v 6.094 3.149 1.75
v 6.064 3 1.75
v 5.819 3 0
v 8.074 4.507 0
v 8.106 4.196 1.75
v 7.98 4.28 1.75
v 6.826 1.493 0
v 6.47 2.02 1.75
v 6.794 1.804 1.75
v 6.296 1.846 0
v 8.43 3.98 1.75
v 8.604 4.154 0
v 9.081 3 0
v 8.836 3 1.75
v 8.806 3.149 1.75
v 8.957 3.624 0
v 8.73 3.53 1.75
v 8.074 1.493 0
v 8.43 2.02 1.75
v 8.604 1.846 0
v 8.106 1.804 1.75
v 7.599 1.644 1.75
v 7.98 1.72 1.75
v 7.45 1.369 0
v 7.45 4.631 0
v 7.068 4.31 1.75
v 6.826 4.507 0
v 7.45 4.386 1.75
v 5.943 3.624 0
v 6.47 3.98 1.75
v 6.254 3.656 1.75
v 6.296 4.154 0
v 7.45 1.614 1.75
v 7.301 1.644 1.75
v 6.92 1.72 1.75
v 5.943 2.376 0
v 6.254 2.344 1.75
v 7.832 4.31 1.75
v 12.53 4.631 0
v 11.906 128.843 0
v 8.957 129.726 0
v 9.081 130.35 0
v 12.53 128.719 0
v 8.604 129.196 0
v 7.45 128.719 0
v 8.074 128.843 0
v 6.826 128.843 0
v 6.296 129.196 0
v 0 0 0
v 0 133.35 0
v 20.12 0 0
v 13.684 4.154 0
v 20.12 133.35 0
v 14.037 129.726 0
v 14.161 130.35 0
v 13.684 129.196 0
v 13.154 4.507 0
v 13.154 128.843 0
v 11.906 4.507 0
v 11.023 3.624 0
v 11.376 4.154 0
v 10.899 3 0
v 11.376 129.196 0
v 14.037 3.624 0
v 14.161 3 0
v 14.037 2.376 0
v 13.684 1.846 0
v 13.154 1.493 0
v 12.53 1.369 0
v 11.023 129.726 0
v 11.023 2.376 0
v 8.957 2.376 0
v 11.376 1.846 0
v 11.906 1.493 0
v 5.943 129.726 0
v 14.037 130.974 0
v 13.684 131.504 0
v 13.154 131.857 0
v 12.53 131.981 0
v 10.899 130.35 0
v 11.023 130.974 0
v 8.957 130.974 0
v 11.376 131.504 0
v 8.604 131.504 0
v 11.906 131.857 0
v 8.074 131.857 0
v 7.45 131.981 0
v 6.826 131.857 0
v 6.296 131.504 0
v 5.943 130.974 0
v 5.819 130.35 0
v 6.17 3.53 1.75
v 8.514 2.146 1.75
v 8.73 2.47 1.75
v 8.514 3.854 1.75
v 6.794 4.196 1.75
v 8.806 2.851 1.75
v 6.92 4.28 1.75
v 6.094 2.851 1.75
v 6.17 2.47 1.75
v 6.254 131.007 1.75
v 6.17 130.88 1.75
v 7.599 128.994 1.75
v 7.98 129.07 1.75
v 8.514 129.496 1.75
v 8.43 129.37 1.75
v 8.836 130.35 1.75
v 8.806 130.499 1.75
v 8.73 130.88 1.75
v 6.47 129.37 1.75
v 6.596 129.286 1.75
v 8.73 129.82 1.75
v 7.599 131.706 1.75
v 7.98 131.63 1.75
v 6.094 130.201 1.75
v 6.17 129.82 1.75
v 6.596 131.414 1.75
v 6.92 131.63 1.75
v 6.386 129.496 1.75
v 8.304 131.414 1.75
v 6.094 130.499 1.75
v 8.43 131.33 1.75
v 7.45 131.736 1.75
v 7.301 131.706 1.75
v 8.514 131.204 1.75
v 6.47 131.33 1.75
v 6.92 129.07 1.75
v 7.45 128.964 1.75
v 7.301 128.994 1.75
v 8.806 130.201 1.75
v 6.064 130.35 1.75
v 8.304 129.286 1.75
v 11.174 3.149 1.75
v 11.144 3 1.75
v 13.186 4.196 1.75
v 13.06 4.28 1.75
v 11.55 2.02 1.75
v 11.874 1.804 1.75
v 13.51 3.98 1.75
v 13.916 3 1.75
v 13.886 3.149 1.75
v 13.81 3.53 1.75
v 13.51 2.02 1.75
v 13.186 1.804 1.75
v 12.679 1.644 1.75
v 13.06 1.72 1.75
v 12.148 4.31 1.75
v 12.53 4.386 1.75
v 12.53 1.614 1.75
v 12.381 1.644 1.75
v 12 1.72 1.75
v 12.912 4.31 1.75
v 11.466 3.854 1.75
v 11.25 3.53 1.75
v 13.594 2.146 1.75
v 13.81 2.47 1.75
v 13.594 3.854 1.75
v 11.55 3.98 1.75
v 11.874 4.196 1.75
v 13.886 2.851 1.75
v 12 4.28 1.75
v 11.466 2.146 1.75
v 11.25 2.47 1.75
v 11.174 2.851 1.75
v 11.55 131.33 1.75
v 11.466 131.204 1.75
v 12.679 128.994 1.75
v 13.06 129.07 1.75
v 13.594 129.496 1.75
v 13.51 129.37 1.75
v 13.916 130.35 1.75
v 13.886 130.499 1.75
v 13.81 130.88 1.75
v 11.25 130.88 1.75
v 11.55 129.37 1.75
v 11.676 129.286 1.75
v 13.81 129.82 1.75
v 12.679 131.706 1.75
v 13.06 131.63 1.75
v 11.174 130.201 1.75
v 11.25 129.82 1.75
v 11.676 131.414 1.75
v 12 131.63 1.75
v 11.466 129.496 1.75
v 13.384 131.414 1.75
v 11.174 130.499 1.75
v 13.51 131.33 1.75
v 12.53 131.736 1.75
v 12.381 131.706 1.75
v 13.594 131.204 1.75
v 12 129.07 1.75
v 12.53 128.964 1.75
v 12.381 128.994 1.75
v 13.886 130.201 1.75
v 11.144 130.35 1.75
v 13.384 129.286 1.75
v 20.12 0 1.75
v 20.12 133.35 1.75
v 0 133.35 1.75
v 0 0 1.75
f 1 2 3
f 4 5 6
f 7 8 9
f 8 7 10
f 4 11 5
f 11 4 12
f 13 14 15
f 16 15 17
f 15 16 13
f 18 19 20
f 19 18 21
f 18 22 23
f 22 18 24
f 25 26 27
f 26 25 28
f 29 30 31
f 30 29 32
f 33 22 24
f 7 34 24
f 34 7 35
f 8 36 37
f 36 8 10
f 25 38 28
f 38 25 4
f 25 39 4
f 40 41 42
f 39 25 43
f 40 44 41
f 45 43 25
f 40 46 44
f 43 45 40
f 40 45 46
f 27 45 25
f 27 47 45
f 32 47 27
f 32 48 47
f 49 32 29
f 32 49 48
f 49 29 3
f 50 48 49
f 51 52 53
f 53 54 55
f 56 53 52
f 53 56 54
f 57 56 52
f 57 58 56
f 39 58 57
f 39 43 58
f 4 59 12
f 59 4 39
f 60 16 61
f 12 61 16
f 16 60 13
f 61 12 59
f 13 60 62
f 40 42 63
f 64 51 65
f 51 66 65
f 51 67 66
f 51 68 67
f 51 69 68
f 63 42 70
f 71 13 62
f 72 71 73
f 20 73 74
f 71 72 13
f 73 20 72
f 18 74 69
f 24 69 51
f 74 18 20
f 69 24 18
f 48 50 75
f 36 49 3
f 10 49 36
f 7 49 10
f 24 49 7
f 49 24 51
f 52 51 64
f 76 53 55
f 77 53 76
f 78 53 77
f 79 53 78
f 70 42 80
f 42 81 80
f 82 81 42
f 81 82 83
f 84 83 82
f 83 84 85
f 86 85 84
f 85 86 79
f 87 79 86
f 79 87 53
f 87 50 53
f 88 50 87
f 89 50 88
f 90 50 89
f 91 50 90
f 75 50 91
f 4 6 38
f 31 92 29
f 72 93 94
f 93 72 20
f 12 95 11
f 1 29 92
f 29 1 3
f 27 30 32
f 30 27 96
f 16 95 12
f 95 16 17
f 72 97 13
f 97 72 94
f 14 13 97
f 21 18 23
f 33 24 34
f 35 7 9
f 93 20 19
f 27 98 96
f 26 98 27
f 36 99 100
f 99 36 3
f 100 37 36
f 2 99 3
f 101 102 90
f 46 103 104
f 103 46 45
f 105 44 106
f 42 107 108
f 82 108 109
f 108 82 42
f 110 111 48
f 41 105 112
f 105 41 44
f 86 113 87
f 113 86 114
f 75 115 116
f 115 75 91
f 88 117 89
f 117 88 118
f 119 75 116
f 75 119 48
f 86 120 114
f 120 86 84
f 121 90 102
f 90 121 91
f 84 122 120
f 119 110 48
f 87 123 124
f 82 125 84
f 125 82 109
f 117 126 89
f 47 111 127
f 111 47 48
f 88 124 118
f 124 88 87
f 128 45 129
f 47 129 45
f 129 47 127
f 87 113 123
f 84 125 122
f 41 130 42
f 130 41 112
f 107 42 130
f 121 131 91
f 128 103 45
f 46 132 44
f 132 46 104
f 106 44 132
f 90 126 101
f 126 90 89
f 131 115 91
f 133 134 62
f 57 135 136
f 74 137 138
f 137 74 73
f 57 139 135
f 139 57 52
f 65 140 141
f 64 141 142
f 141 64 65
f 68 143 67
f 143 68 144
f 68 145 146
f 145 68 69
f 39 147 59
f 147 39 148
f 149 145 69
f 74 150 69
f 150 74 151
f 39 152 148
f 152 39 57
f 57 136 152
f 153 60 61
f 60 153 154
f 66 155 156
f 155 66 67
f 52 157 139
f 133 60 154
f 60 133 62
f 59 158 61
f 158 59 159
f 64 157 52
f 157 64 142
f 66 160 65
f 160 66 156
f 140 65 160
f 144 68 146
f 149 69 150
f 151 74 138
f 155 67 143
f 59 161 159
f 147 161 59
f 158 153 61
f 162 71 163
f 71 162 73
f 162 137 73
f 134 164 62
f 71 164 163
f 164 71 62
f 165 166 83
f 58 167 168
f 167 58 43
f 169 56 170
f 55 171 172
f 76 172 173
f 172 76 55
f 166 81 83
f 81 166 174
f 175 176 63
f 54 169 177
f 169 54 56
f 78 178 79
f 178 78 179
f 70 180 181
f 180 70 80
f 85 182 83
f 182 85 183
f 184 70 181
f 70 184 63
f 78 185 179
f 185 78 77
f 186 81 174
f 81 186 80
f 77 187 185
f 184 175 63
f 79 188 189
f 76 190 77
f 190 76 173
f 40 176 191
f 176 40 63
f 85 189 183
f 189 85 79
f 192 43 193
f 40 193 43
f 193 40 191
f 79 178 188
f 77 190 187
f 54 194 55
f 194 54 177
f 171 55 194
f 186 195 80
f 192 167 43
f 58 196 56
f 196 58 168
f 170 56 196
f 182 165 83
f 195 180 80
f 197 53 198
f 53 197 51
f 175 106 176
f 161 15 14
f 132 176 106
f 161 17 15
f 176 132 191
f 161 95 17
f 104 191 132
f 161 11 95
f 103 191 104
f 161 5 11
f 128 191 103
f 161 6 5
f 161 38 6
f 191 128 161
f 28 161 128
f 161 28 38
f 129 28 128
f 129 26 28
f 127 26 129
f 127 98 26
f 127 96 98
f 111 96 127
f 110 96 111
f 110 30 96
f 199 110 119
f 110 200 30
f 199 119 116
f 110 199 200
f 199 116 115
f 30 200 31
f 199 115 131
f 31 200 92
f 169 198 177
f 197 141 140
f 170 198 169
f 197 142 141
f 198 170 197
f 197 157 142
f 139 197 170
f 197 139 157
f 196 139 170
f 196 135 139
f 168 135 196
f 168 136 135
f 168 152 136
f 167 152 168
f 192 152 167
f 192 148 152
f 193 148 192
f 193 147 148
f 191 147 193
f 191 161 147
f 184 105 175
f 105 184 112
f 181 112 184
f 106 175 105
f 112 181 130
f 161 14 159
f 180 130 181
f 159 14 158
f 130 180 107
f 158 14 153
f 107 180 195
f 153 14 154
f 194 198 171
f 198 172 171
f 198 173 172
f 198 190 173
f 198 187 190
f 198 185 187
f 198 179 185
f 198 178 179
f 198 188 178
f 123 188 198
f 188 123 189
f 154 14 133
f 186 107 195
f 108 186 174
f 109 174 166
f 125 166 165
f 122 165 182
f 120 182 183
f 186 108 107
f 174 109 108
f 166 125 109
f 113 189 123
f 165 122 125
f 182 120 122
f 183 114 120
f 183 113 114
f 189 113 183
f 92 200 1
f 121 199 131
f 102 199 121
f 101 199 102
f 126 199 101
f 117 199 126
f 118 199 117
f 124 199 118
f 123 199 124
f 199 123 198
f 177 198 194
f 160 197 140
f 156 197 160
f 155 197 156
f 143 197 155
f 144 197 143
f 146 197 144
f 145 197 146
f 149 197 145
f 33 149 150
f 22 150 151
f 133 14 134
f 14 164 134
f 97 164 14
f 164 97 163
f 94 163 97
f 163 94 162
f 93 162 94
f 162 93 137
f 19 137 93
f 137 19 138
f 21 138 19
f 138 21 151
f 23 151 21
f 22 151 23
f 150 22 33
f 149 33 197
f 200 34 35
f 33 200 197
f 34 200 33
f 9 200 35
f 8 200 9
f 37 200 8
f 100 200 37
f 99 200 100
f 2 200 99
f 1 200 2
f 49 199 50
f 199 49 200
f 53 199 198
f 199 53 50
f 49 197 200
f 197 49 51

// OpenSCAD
 module cylinderOuter(height, radius, fn) {
   fudge = 1/cos(180/fn);
   cylinder(height, radius*fudge, $fn=fn);
 }


module drawPanel(n=2) {
    height = 133.35;
    horizontal_pitch = 5.08;
    hole_radius = 1.6;
    depth = 1.75;

    function width(incr, hp) = (incr * hp) - 0.2;

    function hole_center_x(incr, hp) = 7.45 + (incr * hp);
    function hole_center_y(h) = abs(h - 3);

    holes = [
        [hole_center_x(0, horizontal_pitch), hole_center_y(0)],  // bottom left
        [hole_center_x(0, horizontal_pitch), hole_center_y(height)], // top left
        [hole_center_x((n-3), horizontal_pitch), hole_center_y(0)], // bottom right
        [hole_center_x((n-3), horizontal_pitch), hole_center_y(height)]  // top right
    ];
    
    difference() {
        cube([width(n, horizontal_pitch), height, depth]);
        for (hole = holes)
            translate([hole.x, hole.y, 0])
                cylinderOuter((depth*2) + 1, hole_radius, 16);
    }
}

drawPanel(4);
